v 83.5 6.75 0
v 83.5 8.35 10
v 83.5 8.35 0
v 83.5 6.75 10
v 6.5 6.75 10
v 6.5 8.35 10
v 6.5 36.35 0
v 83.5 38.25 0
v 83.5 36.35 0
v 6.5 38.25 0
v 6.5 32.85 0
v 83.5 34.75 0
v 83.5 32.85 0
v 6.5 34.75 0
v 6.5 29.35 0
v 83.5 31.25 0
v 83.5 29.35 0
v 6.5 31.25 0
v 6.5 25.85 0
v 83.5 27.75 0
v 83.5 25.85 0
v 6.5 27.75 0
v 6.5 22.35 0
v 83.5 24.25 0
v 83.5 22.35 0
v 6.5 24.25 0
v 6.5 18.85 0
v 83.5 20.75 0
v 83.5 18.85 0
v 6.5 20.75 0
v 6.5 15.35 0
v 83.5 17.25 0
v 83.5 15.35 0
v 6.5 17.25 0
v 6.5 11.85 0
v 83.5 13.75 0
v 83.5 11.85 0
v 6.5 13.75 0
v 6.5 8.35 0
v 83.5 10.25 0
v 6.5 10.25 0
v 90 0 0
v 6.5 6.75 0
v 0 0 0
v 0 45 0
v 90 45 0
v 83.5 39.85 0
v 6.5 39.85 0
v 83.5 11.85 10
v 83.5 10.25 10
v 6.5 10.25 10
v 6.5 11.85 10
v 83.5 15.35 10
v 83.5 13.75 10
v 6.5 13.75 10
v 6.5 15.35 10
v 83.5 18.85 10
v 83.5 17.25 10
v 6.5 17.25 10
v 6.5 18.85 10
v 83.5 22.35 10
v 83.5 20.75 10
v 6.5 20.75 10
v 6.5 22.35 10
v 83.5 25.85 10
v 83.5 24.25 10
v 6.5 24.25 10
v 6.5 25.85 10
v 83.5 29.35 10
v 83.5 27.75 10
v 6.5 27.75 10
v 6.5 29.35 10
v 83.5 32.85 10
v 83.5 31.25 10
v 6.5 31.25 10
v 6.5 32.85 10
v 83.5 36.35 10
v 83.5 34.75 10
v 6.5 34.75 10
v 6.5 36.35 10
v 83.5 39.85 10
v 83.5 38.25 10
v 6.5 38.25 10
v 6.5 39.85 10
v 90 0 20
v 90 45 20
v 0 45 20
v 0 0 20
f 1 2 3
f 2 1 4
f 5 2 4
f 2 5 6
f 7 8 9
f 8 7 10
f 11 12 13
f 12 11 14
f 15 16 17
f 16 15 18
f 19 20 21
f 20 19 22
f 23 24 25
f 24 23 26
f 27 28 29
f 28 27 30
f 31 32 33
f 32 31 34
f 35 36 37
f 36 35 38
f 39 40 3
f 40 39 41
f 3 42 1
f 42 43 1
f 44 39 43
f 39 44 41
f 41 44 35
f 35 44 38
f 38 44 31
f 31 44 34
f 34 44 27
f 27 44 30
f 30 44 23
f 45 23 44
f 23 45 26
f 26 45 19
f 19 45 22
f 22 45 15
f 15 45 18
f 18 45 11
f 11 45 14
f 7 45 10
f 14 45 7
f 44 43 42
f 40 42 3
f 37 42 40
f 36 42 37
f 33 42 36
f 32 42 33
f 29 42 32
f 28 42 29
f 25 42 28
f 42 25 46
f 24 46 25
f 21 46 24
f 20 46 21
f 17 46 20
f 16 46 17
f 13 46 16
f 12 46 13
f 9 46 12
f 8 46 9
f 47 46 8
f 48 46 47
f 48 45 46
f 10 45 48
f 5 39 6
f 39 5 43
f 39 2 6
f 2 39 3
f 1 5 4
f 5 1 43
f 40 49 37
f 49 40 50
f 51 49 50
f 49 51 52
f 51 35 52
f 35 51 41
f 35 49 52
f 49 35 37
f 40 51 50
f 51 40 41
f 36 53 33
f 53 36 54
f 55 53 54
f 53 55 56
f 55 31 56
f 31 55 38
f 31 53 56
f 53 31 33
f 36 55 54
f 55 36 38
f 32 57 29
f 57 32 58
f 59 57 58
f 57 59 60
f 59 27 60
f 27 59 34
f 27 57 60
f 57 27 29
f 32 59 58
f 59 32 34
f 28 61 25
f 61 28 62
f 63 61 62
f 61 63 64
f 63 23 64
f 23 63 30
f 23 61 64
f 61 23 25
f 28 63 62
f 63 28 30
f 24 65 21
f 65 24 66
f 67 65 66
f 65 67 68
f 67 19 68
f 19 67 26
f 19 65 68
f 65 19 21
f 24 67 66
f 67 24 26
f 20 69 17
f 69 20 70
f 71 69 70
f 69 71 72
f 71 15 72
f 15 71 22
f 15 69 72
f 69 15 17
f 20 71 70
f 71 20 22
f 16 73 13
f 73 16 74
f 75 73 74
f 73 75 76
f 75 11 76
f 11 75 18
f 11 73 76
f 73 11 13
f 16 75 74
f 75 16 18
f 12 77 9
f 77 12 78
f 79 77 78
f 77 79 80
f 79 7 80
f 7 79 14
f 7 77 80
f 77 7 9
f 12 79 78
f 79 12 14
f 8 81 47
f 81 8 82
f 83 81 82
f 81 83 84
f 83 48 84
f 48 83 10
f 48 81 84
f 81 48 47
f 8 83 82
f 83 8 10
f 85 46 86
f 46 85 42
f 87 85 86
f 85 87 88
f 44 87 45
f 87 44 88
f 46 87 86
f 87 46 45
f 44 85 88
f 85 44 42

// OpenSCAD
// Microscope slide drying rack - solid base with 10 parallel slots for standing slides.

// Base dimensions
L_base = 90;
W_base = 45;
H_base = 20;

// Slide dimensions
slide_w = 25;
slide_h = 75;
slide_t = 1;

// Slot dimensions
slot_len = 77;
slot_w   = 1.6;
slot_d   = 10;

// Spacing and positioning
slot_c2c = 3.5;
n_slots  = 10;

// Derived positions
// Slots are centred in Y on the block
y_offset = (W_base - (n_slots - 1) * slot_c2c) / 2;

// Slots are centred in X on the block
x_offset = (L_base - slot_len) / 2;

$fn = 64;

difference() {
    // Main solid block
    translate([0, 0, 0]) cube([L_base, W_base, H_base]);

    // Cut 10 slots running along X
    for (i = [0 : n_slots - 1]) {
        // Calculate Y position for this slot
        y_pos = y_offset + i * slot_c2c;
        
        // Slot geometry: runs along X, width in Y, depth in Z
        translate([x_offset, y_pos, 0]) {
            // Cut a rectangular prism for the slot
            // Length = slot_len, Width = slot_w, Depth = slot_d
            cube([slot_len, slot_w, slot_d]);
        }
    }
}
